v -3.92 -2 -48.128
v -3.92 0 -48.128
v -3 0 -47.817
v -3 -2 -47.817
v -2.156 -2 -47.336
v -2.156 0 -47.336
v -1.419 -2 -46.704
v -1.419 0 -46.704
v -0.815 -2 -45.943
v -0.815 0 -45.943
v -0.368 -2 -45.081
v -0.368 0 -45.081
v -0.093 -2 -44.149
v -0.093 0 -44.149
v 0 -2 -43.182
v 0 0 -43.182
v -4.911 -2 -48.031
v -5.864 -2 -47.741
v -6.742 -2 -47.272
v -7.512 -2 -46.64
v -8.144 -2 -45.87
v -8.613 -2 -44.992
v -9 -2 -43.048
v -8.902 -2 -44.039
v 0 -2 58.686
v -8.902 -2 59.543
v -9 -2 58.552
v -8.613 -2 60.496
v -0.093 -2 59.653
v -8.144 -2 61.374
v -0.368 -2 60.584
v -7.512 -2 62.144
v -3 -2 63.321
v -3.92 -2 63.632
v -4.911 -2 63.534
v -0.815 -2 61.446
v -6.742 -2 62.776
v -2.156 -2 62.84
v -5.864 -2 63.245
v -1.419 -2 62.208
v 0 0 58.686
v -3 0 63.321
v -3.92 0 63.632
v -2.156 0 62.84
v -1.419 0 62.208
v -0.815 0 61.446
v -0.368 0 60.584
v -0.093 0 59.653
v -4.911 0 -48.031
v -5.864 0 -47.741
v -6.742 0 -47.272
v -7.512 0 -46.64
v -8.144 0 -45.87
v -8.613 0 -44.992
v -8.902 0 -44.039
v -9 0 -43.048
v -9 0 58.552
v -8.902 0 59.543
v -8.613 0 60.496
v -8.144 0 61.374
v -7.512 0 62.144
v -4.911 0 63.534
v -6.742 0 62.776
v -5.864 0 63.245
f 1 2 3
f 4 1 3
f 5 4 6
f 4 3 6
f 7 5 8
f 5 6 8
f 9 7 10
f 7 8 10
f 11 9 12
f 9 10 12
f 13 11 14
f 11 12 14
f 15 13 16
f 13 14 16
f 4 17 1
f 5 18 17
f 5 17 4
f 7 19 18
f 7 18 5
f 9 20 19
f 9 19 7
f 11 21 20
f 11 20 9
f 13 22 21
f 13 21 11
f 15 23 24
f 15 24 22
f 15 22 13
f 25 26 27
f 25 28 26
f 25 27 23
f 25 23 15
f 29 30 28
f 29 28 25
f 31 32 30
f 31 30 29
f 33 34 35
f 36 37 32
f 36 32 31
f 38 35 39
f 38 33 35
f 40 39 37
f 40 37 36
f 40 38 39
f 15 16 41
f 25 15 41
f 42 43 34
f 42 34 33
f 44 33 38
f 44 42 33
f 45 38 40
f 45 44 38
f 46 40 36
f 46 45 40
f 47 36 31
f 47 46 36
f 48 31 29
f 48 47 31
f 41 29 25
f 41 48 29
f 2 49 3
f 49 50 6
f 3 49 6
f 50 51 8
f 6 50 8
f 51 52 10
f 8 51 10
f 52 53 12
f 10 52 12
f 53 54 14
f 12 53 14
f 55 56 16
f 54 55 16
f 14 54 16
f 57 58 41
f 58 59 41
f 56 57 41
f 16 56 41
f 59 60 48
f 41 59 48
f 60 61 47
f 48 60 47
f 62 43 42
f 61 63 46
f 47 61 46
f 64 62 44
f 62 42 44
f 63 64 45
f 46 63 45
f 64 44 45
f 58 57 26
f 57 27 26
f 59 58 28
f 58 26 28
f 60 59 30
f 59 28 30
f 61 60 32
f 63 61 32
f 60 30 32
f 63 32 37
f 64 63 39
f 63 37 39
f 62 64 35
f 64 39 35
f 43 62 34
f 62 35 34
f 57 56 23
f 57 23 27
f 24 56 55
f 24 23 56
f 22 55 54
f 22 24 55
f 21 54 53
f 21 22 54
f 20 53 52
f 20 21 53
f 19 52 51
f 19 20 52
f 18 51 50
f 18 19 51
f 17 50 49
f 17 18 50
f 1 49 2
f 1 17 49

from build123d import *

# Parameters (mm, degrees)
F0_W        = 9
F0_H        = 111.76
F1_DEPTH    = 2
F2_R        = 5.08
F3_T1_DEPTH = 26.7289304257
F4_R        = 5.08
F5_T1_DEPTH = 26.7289304257


# Not quite as in the source:
# - a fillet or chamfer that OpenCascade refuses, or shapes differently, is made with other operations: its cross-section is extruded or revolved along the edge and cut away or added


with BuildPart() as f1:
    # F0 (on Front) → F1 (new body)
    with BuildSketch(Plane.XZ):
        with Locations((-4.5, 7.7518613339)):
            Rectangle(F0_W, F0_H)
    extrude(amount=F1_DEPTH)

    # F2
    f2_edges = [f1.edges().sort_by_distance(p)[0] for p in [
        (-9, -1, 63.631861),
    ]]
    fillet(f2_edges, radius=F2_R)

    # F3: fillet of radius 5.08 on 1 edges, made by hand

    # F3_s2 → F3_t1 (cut)
    with BuildSketch(Plane.XZ.offset(-12.3644652129)):
        with BuildLine():
            ThreePointArc((-3.92, 63.6318613339), (-1.0988443889, 61.8415149962), (0, 58.6860752487))
            Line((0, 58.6860752487), (0, 63.6318613339))
            Line((0, 63.6318613339), (-3.92, 63.6318613339))
        make_face()
    extrude(amount=F3_T1_DEPTH, mode=Mode.SUBTRACT)

    # F4
    f4_edges = [f1.edges().sort_by_distance(p)[0] for p in [
        (-9, -1, -48.128139),
    ]]
    fillet(f4_edges, radius=F4_R)

    # F5: fillet of radius 5.08 on 1 edges, made by hand

    # F5_s2 → F5_t1 (cut)
    with BuildSketch(Plane.XZ.offset(-12.3644652129)):
        with BuildLine():
            ThreePointArc((-3.92, -48.1281386661), (-1.0988443889, -46.3377923285), (0, -43.182352581))
            Line((0, -43.182352581), (0, -48.1281386661))
            Line((0, -48.1281386661), (-3.92, -48.1281386661))
        make_face()
    extrude(amount=F5_T1_DEPTH, mode=Mode.SUBTRACT)


solid = f1.part
